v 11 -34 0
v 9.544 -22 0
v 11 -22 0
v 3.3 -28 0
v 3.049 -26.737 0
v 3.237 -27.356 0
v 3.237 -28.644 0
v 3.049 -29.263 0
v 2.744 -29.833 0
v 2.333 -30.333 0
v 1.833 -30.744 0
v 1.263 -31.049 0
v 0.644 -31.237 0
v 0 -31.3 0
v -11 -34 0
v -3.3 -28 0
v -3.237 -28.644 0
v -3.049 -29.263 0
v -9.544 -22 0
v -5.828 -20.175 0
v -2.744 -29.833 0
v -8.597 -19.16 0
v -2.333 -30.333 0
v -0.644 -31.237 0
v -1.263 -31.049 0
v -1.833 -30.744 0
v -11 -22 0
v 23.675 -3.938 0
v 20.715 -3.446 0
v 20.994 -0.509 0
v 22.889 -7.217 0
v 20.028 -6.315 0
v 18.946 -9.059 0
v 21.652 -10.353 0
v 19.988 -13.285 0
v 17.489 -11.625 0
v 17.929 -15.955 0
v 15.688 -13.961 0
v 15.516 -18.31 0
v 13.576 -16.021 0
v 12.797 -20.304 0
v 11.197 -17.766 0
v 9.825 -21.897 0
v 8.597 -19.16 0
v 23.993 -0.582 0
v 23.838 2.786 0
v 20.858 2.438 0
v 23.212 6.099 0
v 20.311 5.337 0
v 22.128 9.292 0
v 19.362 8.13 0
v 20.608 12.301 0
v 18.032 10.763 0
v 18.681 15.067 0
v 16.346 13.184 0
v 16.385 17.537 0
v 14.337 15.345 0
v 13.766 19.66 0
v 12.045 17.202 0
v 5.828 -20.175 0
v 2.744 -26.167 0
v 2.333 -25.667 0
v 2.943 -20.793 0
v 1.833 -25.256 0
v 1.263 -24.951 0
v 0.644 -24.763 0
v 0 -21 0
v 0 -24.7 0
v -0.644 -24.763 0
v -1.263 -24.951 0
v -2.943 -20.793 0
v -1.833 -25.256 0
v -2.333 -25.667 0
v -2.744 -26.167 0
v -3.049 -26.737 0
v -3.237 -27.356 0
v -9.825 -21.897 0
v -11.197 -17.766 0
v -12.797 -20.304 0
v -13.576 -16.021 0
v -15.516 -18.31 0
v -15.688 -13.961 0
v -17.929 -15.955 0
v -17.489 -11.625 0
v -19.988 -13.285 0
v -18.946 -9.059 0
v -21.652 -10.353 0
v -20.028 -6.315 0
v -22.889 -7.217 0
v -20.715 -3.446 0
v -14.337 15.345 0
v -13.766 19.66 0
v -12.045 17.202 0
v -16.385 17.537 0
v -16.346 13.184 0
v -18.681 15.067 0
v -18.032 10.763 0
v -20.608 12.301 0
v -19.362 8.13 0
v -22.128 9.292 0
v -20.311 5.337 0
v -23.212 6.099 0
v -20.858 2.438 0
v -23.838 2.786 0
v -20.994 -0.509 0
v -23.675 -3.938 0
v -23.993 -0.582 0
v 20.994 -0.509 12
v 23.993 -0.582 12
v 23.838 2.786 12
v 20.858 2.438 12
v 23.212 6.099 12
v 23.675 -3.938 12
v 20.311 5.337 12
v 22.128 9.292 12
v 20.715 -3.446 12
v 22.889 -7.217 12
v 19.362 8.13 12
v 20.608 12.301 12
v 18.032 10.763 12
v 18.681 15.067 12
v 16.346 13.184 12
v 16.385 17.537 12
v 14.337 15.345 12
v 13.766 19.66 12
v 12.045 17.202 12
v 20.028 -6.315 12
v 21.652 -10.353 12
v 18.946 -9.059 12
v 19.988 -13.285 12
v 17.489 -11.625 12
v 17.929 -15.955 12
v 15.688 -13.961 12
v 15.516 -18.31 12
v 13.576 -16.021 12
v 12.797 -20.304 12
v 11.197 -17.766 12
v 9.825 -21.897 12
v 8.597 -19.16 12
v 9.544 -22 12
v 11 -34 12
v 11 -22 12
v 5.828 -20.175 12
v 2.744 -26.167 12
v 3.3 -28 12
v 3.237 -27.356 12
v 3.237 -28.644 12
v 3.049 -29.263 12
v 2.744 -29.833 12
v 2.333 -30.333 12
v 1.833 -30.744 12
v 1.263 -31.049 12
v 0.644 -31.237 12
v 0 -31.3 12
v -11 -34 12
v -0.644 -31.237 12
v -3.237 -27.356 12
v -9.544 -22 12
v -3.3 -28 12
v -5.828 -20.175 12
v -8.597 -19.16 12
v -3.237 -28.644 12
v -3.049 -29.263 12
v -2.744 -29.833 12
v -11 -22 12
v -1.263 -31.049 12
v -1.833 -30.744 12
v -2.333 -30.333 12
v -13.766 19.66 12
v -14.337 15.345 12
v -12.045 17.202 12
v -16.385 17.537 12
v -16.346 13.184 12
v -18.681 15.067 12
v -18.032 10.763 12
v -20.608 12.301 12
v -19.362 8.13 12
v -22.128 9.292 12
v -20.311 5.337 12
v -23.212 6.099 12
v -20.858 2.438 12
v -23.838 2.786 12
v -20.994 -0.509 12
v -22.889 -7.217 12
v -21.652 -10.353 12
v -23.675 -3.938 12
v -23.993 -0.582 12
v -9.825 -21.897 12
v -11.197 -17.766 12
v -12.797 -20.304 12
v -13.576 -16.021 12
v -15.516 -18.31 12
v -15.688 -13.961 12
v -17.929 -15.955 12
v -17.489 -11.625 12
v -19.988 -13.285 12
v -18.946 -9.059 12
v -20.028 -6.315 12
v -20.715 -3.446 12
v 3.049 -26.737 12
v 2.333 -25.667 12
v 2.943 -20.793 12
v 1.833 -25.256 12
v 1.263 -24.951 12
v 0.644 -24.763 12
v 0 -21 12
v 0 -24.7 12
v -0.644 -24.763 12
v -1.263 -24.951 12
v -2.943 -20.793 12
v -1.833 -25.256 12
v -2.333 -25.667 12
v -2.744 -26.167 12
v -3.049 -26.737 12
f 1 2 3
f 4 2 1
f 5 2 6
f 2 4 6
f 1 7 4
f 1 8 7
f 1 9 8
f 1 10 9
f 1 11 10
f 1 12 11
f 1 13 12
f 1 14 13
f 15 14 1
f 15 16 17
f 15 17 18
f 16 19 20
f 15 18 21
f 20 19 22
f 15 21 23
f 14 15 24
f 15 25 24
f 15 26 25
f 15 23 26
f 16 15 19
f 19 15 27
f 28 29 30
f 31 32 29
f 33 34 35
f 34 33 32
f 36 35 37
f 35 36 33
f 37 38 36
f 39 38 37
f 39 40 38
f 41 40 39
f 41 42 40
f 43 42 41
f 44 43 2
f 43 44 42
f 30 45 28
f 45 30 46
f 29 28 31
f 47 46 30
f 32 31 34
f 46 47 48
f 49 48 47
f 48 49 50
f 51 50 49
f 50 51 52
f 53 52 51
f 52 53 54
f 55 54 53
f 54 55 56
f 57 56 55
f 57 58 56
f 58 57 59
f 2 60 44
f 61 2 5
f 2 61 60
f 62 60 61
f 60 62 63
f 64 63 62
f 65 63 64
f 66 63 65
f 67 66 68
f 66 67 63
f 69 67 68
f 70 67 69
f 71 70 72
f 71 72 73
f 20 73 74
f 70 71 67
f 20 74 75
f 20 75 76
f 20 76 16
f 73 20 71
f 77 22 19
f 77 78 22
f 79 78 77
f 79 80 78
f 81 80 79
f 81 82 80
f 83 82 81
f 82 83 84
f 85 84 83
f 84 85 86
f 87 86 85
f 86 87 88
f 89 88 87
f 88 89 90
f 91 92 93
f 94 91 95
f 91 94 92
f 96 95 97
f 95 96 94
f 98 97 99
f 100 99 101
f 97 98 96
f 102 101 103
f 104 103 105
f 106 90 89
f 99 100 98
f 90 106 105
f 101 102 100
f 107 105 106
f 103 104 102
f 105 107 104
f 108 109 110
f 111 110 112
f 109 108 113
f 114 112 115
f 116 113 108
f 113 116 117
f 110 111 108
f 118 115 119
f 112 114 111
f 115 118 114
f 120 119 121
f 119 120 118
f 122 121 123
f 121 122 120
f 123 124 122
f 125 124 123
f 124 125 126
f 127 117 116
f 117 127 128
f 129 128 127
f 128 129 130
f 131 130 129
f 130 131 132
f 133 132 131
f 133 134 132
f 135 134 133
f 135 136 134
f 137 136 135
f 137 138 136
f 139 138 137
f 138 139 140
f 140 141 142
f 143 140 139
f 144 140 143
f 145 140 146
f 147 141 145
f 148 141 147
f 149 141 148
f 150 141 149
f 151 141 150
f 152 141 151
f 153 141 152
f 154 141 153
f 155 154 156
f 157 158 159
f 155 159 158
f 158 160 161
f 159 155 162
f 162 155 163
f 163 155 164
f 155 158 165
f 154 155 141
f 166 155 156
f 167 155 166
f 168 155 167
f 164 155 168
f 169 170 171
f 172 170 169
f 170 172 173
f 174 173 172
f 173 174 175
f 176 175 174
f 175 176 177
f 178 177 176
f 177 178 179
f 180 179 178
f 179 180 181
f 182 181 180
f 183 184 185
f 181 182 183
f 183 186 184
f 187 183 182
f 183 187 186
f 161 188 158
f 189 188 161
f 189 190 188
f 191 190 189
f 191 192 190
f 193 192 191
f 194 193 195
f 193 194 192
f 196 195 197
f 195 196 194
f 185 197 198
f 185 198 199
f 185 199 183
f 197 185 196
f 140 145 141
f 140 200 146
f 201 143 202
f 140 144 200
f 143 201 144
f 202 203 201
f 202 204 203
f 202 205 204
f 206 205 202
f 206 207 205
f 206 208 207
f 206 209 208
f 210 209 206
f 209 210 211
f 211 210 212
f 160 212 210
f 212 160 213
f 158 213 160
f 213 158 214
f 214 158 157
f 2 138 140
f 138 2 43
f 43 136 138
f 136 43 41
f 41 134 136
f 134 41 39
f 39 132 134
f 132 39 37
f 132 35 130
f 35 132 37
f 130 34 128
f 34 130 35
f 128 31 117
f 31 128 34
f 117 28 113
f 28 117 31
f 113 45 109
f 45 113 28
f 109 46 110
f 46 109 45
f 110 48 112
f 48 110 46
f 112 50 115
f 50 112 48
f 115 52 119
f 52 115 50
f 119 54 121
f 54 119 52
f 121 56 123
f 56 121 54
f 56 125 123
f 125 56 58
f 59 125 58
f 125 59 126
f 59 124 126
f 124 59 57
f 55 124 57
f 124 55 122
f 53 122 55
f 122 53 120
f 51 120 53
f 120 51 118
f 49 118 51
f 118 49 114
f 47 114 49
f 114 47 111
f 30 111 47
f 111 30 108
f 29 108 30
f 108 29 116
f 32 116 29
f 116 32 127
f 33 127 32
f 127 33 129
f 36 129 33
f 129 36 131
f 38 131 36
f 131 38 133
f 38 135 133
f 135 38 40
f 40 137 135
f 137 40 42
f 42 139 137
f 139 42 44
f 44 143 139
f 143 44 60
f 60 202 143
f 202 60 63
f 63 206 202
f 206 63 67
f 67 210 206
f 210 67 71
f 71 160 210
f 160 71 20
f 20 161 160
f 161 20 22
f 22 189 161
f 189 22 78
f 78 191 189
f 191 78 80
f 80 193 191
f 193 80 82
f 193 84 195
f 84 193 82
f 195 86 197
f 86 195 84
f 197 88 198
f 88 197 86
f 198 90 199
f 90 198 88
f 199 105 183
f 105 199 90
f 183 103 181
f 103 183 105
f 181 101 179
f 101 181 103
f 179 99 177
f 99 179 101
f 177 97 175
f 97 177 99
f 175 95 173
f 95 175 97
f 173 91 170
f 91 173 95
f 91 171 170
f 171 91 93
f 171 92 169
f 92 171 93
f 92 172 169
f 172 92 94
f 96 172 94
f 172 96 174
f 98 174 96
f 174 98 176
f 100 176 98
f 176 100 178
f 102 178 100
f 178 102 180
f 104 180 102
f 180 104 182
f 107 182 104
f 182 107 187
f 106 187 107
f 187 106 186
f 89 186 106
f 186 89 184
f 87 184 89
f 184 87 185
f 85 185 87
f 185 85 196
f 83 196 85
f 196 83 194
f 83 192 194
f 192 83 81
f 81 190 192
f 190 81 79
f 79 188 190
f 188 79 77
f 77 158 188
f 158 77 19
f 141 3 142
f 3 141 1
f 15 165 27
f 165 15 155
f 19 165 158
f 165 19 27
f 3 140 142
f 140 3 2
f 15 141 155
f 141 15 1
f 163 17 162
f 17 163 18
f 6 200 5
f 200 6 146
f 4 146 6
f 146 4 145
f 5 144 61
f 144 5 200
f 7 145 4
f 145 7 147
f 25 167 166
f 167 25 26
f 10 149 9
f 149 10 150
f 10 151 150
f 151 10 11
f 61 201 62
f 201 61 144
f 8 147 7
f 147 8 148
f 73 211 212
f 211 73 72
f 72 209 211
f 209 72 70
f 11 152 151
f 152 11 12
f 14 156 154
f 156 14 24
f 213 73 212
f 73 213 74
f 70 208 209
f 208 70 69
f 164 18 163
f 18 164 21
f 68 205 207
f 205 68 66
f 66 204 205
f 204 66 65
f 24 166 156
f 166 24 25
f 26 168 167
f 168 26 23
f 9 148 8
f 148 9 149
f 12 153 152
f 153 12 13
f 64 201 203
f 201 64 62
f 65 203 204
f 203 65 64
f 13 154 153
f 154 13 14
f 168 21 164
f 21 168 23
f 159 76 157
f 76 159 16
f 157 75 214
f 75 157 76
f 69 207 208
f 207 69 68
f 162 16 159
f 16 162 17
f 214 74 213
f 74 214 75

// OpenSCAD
$fn = 32;

// ----------------------------------------------------------------------
// Spring clip: 48 mm outside, 3 mm band, 70 degree opening
// ----------------------------------------------------------------------

// --- parameters (mm) ---
outer_r = 24;             // clip outside radius
inner_r = 21;             // clip bore radius
band = 3;                 // band thickness
clip_w = 12;              // clip width
opening = 70;             // opening angle
tab_w = 22;               // tab width
tab_len = 10;             // tab length past the clip
tab_hole = 6.6;           // tab fixing hole

clip_profile = [[-13.766, 19.66], [-16.385, 17.537], [-18.681, 15.067], [-20.608, 12.301], [-22.128, 9.292], [-23.212, 6.099], [-23.838, 2.786], [-23.993, -0.582], [-23.675, -3.938], [-22.889, -7.217], [-21.652, -10.353], [-19.988, -13.285], [-17.929, -15.955], [-15.516, -18.31], [-12.797, -20.304], [-9.825, -21.897], [-6.66, -23.057], [-3.363, -23.763], [0, -24], [3.363, -23.763], [6.66, -23.057], [9.825, -21.897], [12.797, -20.304], [15.516, -18.31], [17.929, -15.955], [19.988, -13.285], [21.652, -10.353], [22.889, -7.217], [23.675, -3.938], [23.993, -0.582], [23.838, 2.786], [23.212, 6.099], [22.128, 9.292], [20.608, 12.301], [18.681, 15.067], [16.385, 17.537], [13.766, 19.66], [12.045, 17.202], [14.337, 15.345], [16.346, 13.184], [18.032, 10.763], [19.362, 8.13], [20.311, 5.337], [20.858, 2.438], [20.994, -0.509], [20.715, -3.446], [20.028, -6.315], [18.946, -9.059], [17.489, -11.625], [15.688, -13.961], [13.576, -16.021], [11.197, -17.766], [8.597, -19.16], [5.828, -20.175], [2.943, -20.793], [0, -21], [-2.943, -20.793], [-5.828, -20.175], [-8.597, -19.16], [-11.197, -17.766], [-13.576, -16.021], [-15.688, -13.961], [-17.489, -11.625], [-18.946, -9.059], [-20.028, -6.315], [-20.715, -3.446], [-20.994, -0.509], [-20.858, 2.438], [-20.311, 5.337], [-19.362, 8.13], [-18.032, 10.763], [-16.346, 13.184], [-14.337, 15.345], [-12.045, 17.202]];

difference() {
  union() {
    linear_extrude(height = clip_w) polygon(clip_profile);
    /* mounting tab, sunk 2 mm into the band */
    translate([-11, -34, 0]) cube([tab_w, 12, clip_w]);
  }
  translate([0, -28, -2.5]) cylinder(h = clip_w + 5, d = tab_hole);
}
